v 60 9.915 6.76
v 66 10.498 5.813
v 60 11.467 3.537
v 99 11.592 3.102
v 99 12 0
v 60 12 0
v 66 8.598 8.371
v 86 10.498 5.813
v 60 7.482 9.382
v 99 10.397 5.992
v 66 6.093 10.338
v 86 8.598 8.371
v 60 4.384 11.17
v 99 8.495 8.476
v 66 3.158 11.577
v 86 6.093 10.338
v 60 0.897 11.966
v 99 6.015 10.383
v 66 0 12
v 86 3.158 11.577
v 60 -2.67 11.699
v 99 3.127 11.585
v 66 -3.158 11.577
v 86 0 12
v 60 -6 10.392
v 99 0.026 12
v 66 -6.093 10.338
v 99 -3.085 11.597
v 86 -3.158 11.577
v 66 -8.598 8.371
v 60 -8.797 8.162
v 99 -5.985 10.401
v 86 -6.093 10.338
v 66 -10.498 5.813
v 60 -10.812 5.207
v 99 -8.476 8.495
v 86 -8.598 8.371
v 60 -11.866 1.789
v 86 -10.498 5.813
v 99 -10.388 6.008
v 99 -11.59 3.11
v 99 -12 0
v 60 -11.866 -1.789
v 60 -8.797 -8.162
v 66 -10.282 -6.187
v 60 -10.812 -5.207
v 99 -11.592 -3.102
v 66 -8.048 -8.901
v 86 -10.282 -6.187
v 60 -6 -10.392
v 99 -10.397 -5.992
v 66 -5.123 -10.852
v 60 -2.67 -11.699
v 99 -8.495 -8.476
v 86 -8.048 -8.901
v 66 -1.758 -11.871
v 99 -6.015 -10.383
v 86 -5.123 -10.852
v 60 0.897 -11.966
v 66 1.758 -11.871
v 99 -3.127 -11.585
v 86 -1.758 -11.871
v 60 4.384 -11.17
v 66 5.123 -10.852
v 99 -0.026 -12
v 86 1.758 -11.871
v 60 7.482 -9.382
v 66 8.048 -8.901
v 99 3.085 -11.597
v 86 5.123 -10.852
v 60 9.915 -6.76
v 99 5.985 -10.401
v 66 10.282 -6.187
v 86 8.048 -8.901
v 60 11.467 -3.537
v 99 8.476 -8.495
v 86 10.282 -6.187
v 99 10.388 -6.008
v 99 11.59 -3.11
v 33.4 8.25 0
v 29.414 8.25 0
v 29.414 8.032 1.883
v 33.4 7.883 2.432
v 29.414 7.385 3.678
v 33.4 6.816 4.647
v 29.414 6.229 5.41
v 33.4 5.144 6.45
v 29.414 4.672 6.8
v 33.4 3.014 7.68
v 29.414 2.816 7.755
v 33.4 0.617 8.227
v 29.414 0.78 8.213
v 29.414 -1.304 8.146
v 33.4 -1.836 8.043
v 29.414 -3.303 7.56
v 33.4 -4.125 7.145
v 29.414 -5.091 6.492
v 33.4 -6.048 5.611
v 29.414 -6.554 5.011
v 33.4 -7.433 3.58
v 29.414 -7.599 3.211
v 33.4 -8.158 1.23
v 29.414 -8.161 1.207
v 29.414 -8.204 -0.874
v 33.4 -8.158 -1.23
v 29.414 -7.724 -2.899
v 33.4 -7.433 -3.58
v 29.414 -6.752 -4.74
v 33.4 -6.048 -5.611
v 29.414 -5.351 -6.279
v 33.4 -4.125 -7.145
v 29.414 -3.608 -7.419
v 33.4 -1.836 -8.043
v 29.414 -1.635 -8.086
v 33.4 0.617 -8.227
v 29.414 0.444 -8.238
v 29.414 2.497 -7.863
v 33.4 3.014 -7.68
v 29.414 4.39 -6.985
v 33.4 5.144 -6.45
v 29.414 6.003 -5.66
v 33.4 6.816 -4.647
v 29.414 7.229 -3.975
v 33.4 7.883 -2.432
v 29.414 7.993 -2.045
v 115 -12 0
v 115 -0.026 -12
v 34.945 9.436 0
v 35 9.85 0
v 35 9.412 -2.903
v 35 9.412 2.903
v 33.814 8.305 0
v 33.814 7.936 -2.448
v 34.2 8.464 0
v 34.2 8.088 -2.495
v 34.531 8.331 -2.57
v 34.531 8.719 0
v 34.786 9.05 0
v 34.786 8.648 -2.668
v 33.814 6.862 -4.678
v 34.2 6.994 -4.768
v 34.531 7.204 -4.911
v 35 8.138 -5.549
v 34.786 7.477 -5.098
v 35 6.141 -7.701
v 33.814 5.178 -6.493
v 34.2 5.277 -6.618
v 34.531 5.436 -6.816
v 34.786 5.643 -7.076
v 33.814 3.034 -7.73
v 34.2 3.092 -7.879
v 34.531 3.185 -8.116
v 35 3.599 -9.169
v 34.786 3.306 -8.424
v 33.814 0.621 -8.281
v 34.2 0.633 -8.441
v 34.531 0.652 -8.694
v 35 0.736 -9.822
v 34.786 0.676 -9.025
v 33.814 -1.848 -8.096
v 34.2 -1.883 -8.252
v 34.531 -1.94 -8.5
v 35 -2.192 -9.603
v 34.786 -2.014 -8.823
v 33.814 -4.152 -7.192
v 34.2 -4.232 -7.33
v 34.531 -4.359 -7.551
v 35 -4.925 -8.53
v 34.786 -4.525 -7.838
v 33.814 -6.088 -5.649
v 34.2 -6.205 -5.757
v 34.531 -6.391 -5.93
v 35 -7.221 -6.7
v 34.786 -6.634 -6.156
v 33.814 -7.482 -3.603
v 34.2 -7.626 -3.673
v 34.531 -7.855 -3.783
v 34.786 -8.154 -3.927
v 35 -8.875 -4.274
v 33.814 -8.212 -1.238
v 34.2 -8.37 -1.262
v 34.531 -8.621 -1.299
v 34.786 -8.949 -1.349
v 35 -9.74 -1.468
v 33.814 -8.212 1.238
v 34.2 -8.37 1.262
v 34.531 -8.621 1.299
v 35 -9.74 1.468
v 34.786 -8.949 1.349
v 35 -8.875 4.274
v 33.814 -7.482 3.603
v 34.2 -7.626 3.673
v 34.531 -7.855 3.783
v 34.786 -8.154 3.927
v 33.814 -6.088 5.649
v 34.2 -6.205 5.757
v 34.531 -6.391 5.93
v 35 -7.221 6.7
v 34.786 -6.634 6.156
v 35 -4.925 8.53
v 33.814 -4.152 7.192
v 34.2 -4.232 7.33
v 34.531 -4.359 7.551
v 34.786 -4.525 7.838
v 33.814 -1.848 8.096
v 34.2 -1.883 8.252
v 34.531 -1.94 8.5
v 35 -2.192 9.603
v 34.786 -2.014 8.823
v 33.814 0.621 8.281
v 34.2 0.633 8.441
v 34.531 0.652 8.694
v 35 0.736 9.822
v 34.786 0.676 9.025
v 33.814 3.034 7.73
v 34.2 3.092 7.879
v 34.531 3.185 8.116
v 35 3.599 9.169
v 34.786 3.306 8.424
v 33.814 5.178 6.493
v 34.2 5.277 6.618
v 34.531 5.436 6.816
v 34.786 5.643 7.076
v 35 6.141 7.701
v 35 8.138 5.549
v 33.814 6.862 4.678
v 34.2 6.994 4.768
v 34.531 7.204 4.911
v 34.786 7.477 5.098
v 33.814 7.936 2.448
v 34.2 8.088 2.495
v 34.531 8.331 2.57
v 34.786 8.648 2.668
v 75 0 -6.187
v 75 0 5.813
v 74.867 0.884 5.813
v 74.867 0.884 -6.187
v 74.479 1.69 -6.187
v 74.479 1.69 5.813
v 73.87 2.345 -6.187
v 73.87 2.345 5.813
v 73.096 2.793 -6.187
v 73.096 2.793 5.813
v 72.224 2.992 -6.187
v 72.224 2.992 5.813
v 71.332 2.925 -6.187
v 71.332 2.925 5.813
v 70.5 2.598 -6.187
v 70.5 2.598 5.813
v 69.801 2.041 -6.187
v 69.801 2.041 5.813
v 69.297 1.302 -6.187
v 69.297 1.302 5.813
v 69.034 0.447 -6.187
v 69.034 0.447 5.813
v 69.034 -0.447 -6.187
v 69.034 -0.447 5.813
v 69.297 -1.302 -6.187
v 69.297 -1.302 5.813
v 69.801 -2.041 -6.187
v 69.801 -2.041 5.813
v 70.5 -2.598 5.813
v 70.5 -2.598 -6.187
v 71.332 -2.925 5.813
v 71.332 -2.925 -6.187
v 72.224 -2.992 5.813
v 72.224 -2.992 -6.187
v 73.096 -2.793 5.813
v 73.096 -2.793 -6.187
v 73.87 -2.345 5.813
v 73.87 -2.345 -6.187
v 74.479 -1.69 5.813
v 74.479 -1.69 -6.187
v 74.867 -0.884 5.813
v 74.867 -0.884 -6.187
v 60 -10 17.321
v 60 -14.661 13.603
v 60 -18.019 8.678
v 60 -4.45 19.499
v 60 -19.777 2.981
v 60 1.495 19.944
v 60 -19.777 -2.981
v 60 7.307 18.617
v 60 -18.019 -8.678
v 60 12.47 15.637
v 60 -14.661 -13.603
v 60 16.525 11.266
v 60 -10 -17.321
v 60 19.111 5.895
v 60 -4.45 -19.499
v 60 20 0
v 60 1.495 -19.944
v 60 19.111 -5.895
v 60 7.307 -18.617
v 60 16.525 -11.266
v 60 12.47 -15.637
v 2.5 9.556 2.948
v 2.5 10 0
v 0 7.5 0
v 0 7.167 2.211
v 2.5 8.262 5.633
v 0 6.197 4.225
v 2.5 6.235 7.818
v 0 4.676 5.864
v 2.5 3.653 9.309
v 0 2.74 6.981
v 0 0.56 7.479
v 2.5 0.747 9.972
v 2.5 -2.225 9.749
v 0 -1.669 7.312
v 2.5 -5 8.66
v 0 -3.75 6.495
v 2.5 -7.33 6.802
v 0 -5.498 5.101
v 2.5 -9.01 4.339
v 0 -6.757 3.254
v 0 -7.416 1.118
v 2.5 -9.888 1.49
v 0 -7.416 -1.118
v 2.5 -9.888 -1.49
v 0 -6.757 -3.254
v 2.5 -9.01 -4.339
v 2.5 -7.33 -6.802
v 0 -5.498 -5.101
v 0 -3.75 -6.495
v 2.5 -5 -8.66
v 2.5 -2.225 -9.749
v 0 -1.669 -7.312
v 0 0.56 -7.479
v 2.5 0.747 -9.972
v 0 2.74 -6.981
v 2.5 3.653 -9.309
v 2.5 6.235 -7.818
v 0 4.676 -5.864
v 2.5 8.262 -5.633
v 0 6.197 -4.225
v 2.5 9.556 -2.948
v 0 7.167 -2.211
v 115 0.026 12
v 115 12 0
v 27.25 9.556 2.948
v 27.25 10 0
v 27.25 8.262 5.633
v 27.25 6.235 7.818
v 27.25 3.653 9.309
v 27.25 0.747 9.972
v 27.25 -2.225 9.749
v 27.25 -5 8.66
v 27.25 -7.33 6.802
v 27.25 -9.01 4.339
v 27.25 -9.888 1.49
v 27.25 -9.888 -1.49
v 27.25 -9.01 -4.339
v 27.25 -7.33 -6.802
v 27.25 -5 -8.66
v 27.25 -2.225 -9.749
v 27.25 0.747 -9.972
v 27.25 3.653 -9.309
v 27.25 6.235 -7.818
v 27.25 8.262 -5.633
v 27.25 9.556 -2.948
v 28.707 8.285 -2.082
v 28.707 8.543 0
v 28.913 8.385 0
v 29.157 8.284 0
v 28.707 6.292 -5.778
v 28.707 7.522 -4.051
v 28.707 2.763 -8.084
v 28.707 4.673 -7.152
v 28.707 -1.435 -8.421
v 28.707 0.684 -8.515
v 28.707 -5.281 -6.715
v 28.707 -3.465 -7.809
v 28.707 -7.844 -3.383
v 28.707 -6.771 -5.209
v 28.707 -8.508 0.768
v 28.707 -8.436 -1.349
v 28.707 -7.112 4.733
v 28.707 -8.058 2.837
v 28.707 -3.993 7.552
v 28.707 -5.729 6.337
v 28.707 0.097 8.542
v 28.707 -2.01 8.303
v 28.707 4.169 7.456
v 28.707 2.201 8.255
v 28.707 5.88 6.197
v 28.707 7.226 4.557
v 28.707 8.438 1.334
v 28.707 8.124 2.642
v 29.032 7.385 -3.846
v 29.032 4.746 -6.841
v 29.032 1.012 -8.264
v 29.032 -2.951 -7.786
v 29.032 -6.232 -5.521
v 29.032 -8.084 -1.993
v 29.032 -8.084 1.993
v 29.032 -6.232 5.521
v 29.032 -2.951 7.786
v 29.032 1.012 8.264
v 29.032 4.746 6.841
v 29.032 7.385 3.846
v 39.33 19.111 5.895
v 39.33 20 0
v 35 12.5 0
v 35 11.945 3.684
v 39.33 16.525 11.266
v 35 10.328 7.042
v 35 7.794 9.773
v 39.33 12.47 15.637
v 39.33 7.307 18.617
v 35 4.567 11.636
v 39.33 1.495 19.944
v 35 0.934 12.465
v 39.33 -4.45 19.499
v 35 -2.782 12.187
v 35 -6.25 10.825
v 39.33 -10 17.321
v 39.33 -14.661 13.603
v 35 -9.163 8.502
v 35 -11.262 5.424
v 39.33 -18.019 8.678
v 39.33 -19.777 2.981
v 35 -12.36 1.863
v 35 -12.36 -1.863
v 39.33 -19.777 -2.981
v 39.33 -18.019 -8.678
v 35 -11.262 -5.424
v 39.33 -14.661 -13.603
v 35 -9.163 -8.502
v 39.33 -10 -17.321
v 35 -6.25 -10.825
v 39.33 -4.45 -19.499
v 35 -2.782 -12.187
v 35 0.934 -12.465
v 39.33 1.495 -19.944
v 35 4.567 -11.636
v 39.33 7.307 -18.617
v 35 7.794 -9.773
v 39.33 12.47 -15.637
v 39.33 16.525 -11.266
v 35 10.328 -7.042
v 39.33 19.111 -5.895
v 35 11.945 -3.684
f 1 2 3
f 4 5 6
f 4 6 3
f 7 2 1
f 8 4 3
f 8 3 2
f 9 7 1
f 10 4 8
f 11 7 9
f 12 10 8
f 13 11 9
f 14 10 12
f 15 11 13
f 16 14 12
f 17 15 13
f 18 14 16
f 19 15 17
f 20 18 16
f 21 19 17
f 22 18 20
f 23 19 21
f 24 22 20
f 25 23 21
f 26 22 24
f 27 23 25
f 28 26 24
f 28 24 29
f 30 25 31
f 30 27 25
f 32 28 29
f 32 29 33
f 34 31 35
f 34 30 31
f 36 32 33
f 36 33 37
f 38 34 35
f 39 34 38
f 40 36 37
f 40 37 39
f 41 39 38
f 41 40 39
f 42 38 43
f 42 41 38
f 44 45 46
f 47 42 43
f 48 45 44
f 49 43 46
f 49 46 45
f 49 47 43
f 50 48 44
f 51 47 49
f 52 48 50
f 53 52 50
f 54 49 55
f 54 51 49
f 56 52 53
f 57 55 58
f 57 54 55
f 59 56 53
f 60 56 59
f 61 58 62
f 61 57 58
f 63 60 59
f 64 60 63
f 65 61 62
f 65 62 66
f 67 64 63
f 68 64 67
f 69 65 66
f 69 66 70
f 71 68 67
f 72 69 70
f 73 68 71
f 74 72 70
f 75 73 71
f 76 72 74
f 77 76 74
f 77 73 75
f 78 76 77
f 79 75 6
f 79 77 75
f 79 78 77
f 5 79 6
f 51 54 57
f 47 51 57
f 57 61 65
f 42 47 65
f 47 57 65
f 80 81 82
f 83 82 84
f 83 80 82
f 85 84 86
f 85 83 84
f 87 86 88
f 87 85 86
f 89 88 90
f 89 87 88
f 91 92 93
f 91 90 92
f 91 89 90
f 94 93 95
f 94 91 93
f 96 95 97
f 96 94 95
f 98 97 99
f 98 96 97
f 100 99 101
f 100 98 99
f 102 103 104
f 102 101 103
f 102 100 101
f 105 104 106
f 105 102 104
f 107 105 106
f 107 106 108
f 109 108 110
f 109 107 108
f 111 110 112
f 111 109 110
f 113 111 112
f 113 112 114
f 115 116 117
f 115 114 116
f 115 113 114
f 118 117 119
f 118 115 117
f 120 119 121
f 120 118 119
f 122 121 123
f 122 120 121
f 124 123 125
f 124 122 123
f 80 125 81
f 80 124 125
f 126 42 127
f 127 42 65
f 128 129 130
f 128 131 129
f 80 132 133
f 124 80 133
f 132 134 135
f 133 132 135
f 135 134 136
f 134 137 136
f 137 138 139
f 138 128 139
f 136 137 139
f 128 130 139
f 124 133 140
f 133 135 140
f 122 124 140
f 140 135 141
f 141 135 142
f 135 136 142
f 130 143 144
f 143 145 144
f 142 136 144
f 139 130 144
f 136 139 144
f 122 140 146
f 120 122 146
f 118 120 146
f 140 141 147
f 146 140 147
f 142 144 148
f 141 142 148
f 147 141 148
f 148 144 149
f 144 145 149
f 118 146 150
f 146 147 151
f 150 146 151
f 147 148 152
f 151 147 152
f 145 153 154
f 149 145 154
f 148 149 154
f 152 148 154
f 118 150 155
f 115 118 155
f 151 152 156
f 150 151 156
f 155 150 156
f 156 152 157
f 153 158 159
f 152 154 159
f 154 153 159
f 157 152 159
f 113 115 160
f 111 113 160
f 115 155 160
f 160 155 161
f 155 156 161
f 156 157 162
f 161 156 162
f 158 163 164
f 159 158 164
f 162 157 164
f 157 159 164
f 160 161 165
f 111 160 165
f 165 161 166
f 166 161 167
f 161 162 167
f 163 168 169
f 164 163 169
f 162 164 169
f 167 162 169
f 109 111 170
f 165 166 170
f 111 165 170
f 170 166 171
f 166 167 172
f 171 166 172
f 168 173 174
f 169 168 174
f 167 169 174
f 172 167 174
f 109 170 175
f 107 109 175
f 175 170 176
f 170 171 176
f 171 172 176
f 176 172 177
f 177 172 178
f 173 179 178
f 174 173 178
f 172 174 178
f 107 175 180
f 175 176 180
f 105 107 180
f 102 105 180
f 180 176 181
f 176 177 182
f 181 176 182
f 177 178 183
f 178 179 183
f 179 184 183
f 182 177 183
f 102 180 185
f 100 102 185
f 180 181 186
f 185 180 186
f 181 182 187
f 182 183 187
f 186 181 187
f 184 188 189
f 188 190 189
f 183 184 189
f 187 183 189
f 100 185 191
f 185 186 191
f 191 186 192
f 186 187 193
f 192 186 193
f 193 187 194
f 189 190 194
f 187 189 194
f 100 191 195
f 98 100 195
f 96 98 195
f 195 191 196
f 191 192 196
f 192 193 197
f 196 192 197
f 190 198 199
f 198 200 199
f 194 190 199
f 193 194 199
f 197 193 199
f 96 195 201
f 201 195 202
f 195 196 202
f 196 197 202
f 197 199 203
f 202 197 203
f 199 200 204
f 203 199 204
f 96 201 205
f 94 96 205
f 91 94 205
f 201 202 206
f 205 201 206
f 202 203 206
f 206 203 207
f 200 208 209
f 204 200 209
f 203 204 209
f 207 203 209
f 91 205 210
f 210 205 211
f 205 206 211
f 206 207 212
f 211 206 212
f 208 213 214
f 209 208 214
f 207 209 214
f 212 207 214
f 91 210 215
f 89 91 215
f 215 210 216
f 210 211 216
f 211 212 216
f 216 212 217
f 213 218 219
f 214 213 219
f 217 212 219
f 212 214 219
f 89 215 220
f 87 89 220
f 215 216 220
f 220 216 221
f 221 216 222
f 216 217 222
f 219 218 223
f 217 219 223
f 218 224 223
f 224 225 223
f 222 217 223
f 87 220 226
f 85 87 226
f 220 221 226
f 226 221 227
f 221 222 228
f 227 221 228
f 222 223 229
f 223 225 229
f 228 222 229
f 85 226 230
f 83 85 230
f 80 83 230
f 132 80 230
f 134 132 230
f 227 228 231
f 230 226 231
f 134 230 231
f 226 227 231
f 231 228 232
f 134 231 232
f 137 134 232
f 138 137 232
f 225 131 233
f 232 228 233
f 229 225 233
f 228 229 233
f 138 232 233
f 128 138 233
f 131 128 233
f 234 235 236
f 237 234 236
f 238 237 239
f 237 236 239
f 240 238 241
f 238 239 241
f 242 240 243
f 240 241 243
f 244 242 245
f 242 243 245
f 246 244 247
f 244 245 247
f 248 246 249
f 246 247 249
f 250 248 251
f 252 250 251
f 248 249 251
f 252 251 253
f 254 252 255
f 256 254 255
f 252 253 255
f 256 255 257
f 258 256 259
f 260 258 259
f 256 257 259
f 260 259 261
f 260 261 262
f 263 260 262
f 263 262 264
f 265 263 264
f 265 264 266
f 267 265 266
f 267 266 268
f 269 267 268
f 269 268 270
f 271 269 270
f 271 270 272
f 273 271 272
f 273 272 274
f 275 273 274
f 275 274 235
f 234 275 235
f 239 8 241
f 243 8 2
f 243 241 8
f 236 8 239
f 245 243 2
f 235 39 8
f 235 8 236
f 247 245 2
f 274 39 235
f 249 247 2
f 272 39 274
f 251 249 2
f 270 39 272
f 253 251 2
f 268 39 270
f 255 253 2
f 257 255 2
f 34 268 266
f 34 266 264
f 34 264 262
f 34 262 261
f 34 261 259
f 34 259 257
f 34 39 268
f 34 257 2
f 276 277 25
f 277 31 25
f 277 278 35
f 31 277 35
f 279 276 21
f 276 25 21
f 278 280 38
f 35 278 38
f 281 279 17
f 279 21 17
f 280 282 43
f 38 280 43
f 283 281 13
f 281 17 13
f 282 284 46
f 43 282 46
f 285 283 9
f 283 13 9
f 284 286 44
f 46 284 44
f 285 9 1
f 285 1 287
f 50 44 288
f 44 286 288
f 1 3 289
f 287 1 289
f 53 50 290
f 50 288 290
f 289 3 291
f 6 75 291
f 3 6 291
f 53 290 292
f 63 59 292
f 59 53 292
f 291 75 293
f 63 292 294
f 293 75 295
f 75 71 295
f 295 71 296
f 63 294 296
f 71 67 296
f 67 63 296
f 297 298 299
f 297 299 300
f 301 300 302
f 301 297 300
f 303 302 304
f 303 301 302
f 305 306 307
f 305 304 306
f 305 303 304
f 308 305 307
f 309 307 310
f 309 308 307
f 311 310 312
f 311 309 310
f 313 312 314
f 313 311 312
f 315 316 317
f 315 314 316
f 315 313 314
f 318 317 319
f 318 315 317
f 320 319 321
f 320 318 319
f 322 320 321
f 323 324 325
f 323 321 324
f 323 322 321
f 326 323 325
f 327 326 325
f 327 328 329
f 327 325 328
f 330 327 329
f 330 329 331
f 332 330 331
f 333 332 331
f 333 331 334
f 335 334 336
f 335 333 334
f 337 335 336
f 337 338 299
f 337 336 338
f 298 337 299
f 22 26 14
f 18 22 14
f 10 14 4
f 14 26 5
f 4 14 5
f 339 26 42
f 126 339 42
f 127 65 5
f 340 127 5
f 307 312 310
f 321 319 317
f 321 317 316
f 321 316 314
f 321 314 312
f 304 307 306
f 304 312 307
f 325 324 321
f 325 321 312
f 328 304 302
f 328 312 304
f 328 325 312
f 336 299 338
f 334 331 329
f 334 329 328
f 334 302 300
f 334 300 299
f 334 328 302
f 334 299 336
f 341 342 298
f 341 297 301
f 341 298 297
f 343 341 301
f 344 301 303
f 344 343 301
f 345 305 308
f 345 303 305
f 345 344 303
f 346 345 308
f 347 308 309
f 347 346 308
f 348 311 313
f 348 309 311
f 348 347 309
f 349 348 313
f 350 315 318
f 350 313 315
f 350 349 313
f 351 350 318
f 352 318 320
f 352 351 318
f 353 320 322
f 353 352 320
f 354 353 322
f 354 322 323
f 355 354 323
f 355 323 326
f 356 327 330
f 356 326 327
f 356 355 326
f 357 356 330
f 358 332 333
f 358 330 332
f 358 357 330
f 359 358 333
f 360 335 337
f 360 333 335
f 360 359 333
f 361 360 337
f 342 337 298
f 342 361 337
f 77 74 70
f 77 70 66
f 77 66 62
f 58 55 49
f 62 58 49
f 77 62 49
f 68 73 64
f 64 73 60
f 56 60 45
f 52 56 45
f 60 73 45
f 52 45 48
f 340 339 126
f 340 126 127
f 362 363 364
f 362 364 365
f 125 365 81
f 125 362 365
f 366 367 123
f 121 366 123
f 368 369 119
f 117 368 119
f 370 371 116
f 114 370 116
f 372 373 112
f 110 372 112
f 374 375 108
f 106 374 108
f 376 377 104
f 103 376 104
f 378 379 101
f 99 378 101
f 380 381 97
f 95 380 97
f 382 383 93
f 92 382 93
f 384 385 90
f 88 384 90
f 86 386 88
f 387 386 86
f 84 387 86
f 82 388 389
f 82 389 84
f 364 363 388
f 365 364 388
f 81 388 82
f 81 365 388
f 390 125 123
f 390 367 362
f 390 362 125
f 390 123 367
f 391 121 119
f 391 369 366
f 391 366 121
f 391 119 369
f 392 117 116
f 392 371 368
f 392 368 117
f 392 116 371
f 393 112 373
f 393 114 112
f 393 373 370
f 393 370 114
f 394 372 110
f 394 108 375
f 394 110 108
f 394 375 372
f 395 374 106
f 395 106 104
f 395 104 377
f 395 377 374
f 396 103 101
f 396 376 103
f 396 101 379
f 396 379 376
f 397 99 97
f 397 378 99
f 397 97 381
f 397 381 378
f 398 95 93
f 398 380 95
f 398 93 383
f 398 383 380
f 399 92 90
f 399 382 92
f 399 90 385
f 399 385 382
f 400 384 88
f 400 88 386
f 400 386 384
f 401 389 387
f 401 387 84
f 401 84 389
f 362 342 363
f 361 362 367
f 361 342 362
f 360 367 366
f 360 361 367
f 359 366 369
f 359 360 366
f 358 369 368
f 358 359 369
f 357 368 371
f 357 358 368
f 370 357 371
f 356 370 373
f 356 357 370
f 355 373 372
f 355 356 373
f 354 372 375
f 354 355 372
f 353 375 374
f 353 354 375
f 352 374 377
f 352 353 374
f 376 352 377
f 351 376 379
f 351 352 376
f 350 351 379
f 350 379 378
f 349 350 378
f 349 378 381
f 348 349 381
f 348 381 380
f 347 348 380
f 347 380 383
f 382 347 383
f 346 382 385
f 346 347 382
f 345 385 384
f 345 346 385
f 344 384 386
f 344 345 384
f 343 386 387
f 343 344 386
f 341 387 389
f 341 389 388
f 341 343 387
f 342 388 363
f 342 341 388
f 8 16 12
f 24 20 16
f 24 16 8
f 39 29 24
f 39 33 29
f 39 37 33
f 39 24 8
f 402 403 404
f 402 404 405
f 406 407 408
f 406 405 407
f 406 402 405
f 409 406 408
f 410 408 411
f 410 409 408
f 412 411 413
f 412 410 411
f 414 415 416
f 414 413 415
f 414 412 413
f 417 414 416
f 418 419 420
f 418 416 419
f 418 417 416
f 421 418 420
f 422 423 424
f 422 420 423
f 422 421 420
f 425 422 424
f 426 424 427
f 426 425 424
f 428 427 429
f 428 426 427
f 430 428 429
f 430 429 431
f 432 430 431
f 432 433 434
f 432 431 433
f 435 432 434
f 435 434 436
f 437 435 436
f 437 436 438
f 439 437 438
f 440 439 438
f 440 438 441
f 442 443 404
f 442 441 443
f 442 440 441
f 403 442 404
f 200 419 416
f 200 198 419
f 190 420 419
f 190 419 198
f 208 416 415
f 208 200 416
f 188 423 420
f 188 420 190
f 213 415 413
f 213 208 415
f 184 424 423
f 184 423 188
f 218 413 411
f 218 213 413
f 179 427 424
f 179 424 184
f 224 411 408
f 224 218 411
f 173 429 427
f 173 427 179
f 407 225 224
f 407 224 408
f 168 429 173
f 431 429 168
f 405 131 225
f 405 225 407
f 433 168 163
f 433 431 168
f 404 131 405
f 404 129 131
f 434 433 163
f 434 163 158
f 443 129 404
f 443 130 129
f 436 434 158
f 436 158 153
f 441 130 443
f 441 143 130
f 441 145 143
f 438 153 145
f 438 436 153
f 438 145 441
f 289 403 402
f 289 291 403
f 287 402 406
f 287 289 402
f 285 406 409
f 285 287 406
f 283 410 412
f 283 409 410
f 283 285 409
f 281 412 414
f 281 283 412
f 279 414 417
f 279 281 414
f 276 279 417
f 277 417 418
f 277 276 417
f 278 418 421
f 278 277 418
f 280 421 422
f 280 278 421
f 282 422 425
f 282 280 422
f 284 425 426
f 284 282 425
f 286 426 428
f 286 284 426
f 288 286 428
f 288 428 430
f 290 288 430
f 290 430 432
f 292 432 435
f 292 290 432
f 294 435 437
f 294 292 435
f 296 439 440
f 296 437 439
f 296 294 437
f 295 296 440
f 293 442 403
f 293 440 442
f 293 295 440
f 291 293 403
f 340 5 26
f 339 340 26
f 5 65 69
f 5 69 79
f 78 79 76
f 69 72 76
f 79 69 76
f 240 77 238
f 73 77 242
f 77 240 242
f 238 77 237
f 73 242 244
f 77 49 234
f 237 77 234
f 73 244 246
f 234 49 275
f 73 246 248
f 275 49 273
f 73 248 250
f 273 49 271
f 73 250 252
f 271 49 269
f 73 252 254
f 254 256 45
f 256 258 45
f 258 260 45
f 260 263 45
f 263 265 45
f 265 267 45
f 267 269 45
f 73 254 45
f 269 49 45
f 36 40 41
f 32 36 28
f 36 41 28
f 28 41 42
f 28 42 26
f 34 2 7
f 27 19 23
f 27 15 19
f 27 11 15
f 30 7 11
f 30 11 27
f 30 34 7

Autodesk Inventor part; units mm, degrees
ref_plane "YZ Plane" through (0, 0, 0) normal (1, 0, 0) x (0, 1, 0)
ref_plane "XZ Plane" through (0, 0, 0) normal (0, 1, 0) x (-1, 0, 0)
ref_plane "XY Plane" through (0, 0, 0) normal (0, 0, 1) x (1, 0, 0)
sketch "Эскиз1" plane through (0, 0, 0) normal (0, 0, 1) x (1, 0, 0)
  line L0 (0, 0) -> (0, 9.9999)
  line L1 (0, 9.9999) -> (27.2501, 9.9999)
  line L2 (27.2501, 9.9999) -> (29, 8.25)
  line L3 (29, 8.25) -> (35, 8.25)
  line L4 (35, 8.25) -> (35, 12.5)
  line L5 (35, 12.5) -> (39.3301, 20)
  line L6 (39.3301, 20) -> (60, 20)
  line L7 (60, 20) -> (60, 12)
  line L8 (60, 12) -> (99, 12)
  line L9 (99, 12) -> (99, 0)
  line L10 (99, 0) -> (0, 0)
  dimension "d1" = 45
  dimension "d2" = 30
  dimension "d3" = 6
  dimension "d4" = 35
  dimension "d7" = 24
  dimension "d8" = 19.9998
  dimension "d9" = 16.5
  dimension "d10" = 25
  dimension "d11" = 39
  dimension "d12" = 99
  dimension "d14" = 40
revolve "Вращение1" add sketch "Эскиз1" angle 360 about axis through (99, 0, 0) along (-1, 0, 0)
sketch "Эскиз2" plane through (99, 0, 0) normal (1, 0, 0) x (0, 0, -1)
  circle A0 centre (0, 0) radius 12 projected
  line L0 (12, 0) -> (0, 12)
  line L1 (0, 12) -> (-12.0353, -0.0353)
  line L2 (-12.0353, -0.0353) -> (-0.0353, -12.0353)
  line L3 (-0.0353, -12.0353) -> (12, 0)
extrude "Выдавливание1" [suppressed]
sketch "Эскиз3" plane through (0, 0, 0) normal (0, 1, 0) x (-1, 0, 0)
  point P0 (0, 0)
sketch "Эскиз4" plane through (0, 0, 0) normal (0, 1, 0) x (-1, 0, 0)
  line L0 (-60, -12) -> (-99, -12) projected
  line L1 (-66, -12) -> (-86, -12)
  line L2 (-86, -12) -> (-86, -6.1869)
  line L3 (-86, -6.1869) -> (-66, -6.1869)
  line L4 (-66, -6.1869) -> (-66, -12)
  line L5 (-60, 12) -> (-99, 12) projected
  line L6 (-66, 12) -> (-86, 12)
  line L7 (-86, 12) -> (-86, 5.8131)
  line L8 (-86, 5.8131) -> (-66, 5.8131)
  line L9 (-66, 5.8131) -> (-66, 12)
  line L10 (-60, 20) -> (-60, -20) projected
  point P0 (0, 0)
  dimension "d18" = 6
  dimension "d19" = 6
  dimension "d20" = 20
  dimension "d21" = 12
extrude "Выдавливание2" cut sketch "Эскиз4" along normal through all both and the other way through all
sketch "Эскиз5" plane through (0, 0, 0) normal (0, 0, 1) x (1, 0, 0)
  line L0 (60, -12) -> (60, 12) projected
  line L1 (60, -20) -> (60, 20) projected
  line L2 (-21.8, 0) -> (130.8, 0) projected
  circle A0 centre (72, 0) radius 3
  point P0 (0, 0)
  dimension "d24" = 6
  dimension "d25" = 12
extrude "Выдавливание3" cut sketch "Эскиз5" along normal through all both and the other way through all
thread "Резьба1" size "M20x2.5" class "6g" standard "ISO Metric profile" full length
chamfer "Фаска1" distance 2.5 angle 45 1 edges at (0, -9.9999, 0)
fillet "Сопряжение1" radius 1 1 edges at (29, -8.25, 0)
fillet "Сопряжение2" radius 1.6 1 edges at (35, -8.25, 0)
sketch "Эскиз6" plane through (72, 0, 0) normal (0, 0, 1) x (1, 0, 0)
  point P0 (-72, 0)
sketch "Эскиз7" plane through (99, -8.4853, 8.4853) normal (0, 0, 1) x (1, 0, 0)
  point P0 (-99, 8.4853)
sketch "Эскиз8" plane through (99, 0, 0) normal (1, 0, 0) x (0, 0, -1)
  circle A0 centre (0, 0) radius 12 projected
  circle A1 centre (0, 0) radius 12 projected
  line L0 (12, -0.0264) -> (0, 12)
  line L1 (0, 12) -> (-12, 0.0264)
  line L2 (-12, 0.0264) -> (0, -12)
  line L3 (0, -12) -> (12, -0.0264)
extrude "Выдавливание4" add sketch "Эскиз8" along normal blind 16 contours L0 L3 L2 L1
properties part number "Семинр Курганова вал"
